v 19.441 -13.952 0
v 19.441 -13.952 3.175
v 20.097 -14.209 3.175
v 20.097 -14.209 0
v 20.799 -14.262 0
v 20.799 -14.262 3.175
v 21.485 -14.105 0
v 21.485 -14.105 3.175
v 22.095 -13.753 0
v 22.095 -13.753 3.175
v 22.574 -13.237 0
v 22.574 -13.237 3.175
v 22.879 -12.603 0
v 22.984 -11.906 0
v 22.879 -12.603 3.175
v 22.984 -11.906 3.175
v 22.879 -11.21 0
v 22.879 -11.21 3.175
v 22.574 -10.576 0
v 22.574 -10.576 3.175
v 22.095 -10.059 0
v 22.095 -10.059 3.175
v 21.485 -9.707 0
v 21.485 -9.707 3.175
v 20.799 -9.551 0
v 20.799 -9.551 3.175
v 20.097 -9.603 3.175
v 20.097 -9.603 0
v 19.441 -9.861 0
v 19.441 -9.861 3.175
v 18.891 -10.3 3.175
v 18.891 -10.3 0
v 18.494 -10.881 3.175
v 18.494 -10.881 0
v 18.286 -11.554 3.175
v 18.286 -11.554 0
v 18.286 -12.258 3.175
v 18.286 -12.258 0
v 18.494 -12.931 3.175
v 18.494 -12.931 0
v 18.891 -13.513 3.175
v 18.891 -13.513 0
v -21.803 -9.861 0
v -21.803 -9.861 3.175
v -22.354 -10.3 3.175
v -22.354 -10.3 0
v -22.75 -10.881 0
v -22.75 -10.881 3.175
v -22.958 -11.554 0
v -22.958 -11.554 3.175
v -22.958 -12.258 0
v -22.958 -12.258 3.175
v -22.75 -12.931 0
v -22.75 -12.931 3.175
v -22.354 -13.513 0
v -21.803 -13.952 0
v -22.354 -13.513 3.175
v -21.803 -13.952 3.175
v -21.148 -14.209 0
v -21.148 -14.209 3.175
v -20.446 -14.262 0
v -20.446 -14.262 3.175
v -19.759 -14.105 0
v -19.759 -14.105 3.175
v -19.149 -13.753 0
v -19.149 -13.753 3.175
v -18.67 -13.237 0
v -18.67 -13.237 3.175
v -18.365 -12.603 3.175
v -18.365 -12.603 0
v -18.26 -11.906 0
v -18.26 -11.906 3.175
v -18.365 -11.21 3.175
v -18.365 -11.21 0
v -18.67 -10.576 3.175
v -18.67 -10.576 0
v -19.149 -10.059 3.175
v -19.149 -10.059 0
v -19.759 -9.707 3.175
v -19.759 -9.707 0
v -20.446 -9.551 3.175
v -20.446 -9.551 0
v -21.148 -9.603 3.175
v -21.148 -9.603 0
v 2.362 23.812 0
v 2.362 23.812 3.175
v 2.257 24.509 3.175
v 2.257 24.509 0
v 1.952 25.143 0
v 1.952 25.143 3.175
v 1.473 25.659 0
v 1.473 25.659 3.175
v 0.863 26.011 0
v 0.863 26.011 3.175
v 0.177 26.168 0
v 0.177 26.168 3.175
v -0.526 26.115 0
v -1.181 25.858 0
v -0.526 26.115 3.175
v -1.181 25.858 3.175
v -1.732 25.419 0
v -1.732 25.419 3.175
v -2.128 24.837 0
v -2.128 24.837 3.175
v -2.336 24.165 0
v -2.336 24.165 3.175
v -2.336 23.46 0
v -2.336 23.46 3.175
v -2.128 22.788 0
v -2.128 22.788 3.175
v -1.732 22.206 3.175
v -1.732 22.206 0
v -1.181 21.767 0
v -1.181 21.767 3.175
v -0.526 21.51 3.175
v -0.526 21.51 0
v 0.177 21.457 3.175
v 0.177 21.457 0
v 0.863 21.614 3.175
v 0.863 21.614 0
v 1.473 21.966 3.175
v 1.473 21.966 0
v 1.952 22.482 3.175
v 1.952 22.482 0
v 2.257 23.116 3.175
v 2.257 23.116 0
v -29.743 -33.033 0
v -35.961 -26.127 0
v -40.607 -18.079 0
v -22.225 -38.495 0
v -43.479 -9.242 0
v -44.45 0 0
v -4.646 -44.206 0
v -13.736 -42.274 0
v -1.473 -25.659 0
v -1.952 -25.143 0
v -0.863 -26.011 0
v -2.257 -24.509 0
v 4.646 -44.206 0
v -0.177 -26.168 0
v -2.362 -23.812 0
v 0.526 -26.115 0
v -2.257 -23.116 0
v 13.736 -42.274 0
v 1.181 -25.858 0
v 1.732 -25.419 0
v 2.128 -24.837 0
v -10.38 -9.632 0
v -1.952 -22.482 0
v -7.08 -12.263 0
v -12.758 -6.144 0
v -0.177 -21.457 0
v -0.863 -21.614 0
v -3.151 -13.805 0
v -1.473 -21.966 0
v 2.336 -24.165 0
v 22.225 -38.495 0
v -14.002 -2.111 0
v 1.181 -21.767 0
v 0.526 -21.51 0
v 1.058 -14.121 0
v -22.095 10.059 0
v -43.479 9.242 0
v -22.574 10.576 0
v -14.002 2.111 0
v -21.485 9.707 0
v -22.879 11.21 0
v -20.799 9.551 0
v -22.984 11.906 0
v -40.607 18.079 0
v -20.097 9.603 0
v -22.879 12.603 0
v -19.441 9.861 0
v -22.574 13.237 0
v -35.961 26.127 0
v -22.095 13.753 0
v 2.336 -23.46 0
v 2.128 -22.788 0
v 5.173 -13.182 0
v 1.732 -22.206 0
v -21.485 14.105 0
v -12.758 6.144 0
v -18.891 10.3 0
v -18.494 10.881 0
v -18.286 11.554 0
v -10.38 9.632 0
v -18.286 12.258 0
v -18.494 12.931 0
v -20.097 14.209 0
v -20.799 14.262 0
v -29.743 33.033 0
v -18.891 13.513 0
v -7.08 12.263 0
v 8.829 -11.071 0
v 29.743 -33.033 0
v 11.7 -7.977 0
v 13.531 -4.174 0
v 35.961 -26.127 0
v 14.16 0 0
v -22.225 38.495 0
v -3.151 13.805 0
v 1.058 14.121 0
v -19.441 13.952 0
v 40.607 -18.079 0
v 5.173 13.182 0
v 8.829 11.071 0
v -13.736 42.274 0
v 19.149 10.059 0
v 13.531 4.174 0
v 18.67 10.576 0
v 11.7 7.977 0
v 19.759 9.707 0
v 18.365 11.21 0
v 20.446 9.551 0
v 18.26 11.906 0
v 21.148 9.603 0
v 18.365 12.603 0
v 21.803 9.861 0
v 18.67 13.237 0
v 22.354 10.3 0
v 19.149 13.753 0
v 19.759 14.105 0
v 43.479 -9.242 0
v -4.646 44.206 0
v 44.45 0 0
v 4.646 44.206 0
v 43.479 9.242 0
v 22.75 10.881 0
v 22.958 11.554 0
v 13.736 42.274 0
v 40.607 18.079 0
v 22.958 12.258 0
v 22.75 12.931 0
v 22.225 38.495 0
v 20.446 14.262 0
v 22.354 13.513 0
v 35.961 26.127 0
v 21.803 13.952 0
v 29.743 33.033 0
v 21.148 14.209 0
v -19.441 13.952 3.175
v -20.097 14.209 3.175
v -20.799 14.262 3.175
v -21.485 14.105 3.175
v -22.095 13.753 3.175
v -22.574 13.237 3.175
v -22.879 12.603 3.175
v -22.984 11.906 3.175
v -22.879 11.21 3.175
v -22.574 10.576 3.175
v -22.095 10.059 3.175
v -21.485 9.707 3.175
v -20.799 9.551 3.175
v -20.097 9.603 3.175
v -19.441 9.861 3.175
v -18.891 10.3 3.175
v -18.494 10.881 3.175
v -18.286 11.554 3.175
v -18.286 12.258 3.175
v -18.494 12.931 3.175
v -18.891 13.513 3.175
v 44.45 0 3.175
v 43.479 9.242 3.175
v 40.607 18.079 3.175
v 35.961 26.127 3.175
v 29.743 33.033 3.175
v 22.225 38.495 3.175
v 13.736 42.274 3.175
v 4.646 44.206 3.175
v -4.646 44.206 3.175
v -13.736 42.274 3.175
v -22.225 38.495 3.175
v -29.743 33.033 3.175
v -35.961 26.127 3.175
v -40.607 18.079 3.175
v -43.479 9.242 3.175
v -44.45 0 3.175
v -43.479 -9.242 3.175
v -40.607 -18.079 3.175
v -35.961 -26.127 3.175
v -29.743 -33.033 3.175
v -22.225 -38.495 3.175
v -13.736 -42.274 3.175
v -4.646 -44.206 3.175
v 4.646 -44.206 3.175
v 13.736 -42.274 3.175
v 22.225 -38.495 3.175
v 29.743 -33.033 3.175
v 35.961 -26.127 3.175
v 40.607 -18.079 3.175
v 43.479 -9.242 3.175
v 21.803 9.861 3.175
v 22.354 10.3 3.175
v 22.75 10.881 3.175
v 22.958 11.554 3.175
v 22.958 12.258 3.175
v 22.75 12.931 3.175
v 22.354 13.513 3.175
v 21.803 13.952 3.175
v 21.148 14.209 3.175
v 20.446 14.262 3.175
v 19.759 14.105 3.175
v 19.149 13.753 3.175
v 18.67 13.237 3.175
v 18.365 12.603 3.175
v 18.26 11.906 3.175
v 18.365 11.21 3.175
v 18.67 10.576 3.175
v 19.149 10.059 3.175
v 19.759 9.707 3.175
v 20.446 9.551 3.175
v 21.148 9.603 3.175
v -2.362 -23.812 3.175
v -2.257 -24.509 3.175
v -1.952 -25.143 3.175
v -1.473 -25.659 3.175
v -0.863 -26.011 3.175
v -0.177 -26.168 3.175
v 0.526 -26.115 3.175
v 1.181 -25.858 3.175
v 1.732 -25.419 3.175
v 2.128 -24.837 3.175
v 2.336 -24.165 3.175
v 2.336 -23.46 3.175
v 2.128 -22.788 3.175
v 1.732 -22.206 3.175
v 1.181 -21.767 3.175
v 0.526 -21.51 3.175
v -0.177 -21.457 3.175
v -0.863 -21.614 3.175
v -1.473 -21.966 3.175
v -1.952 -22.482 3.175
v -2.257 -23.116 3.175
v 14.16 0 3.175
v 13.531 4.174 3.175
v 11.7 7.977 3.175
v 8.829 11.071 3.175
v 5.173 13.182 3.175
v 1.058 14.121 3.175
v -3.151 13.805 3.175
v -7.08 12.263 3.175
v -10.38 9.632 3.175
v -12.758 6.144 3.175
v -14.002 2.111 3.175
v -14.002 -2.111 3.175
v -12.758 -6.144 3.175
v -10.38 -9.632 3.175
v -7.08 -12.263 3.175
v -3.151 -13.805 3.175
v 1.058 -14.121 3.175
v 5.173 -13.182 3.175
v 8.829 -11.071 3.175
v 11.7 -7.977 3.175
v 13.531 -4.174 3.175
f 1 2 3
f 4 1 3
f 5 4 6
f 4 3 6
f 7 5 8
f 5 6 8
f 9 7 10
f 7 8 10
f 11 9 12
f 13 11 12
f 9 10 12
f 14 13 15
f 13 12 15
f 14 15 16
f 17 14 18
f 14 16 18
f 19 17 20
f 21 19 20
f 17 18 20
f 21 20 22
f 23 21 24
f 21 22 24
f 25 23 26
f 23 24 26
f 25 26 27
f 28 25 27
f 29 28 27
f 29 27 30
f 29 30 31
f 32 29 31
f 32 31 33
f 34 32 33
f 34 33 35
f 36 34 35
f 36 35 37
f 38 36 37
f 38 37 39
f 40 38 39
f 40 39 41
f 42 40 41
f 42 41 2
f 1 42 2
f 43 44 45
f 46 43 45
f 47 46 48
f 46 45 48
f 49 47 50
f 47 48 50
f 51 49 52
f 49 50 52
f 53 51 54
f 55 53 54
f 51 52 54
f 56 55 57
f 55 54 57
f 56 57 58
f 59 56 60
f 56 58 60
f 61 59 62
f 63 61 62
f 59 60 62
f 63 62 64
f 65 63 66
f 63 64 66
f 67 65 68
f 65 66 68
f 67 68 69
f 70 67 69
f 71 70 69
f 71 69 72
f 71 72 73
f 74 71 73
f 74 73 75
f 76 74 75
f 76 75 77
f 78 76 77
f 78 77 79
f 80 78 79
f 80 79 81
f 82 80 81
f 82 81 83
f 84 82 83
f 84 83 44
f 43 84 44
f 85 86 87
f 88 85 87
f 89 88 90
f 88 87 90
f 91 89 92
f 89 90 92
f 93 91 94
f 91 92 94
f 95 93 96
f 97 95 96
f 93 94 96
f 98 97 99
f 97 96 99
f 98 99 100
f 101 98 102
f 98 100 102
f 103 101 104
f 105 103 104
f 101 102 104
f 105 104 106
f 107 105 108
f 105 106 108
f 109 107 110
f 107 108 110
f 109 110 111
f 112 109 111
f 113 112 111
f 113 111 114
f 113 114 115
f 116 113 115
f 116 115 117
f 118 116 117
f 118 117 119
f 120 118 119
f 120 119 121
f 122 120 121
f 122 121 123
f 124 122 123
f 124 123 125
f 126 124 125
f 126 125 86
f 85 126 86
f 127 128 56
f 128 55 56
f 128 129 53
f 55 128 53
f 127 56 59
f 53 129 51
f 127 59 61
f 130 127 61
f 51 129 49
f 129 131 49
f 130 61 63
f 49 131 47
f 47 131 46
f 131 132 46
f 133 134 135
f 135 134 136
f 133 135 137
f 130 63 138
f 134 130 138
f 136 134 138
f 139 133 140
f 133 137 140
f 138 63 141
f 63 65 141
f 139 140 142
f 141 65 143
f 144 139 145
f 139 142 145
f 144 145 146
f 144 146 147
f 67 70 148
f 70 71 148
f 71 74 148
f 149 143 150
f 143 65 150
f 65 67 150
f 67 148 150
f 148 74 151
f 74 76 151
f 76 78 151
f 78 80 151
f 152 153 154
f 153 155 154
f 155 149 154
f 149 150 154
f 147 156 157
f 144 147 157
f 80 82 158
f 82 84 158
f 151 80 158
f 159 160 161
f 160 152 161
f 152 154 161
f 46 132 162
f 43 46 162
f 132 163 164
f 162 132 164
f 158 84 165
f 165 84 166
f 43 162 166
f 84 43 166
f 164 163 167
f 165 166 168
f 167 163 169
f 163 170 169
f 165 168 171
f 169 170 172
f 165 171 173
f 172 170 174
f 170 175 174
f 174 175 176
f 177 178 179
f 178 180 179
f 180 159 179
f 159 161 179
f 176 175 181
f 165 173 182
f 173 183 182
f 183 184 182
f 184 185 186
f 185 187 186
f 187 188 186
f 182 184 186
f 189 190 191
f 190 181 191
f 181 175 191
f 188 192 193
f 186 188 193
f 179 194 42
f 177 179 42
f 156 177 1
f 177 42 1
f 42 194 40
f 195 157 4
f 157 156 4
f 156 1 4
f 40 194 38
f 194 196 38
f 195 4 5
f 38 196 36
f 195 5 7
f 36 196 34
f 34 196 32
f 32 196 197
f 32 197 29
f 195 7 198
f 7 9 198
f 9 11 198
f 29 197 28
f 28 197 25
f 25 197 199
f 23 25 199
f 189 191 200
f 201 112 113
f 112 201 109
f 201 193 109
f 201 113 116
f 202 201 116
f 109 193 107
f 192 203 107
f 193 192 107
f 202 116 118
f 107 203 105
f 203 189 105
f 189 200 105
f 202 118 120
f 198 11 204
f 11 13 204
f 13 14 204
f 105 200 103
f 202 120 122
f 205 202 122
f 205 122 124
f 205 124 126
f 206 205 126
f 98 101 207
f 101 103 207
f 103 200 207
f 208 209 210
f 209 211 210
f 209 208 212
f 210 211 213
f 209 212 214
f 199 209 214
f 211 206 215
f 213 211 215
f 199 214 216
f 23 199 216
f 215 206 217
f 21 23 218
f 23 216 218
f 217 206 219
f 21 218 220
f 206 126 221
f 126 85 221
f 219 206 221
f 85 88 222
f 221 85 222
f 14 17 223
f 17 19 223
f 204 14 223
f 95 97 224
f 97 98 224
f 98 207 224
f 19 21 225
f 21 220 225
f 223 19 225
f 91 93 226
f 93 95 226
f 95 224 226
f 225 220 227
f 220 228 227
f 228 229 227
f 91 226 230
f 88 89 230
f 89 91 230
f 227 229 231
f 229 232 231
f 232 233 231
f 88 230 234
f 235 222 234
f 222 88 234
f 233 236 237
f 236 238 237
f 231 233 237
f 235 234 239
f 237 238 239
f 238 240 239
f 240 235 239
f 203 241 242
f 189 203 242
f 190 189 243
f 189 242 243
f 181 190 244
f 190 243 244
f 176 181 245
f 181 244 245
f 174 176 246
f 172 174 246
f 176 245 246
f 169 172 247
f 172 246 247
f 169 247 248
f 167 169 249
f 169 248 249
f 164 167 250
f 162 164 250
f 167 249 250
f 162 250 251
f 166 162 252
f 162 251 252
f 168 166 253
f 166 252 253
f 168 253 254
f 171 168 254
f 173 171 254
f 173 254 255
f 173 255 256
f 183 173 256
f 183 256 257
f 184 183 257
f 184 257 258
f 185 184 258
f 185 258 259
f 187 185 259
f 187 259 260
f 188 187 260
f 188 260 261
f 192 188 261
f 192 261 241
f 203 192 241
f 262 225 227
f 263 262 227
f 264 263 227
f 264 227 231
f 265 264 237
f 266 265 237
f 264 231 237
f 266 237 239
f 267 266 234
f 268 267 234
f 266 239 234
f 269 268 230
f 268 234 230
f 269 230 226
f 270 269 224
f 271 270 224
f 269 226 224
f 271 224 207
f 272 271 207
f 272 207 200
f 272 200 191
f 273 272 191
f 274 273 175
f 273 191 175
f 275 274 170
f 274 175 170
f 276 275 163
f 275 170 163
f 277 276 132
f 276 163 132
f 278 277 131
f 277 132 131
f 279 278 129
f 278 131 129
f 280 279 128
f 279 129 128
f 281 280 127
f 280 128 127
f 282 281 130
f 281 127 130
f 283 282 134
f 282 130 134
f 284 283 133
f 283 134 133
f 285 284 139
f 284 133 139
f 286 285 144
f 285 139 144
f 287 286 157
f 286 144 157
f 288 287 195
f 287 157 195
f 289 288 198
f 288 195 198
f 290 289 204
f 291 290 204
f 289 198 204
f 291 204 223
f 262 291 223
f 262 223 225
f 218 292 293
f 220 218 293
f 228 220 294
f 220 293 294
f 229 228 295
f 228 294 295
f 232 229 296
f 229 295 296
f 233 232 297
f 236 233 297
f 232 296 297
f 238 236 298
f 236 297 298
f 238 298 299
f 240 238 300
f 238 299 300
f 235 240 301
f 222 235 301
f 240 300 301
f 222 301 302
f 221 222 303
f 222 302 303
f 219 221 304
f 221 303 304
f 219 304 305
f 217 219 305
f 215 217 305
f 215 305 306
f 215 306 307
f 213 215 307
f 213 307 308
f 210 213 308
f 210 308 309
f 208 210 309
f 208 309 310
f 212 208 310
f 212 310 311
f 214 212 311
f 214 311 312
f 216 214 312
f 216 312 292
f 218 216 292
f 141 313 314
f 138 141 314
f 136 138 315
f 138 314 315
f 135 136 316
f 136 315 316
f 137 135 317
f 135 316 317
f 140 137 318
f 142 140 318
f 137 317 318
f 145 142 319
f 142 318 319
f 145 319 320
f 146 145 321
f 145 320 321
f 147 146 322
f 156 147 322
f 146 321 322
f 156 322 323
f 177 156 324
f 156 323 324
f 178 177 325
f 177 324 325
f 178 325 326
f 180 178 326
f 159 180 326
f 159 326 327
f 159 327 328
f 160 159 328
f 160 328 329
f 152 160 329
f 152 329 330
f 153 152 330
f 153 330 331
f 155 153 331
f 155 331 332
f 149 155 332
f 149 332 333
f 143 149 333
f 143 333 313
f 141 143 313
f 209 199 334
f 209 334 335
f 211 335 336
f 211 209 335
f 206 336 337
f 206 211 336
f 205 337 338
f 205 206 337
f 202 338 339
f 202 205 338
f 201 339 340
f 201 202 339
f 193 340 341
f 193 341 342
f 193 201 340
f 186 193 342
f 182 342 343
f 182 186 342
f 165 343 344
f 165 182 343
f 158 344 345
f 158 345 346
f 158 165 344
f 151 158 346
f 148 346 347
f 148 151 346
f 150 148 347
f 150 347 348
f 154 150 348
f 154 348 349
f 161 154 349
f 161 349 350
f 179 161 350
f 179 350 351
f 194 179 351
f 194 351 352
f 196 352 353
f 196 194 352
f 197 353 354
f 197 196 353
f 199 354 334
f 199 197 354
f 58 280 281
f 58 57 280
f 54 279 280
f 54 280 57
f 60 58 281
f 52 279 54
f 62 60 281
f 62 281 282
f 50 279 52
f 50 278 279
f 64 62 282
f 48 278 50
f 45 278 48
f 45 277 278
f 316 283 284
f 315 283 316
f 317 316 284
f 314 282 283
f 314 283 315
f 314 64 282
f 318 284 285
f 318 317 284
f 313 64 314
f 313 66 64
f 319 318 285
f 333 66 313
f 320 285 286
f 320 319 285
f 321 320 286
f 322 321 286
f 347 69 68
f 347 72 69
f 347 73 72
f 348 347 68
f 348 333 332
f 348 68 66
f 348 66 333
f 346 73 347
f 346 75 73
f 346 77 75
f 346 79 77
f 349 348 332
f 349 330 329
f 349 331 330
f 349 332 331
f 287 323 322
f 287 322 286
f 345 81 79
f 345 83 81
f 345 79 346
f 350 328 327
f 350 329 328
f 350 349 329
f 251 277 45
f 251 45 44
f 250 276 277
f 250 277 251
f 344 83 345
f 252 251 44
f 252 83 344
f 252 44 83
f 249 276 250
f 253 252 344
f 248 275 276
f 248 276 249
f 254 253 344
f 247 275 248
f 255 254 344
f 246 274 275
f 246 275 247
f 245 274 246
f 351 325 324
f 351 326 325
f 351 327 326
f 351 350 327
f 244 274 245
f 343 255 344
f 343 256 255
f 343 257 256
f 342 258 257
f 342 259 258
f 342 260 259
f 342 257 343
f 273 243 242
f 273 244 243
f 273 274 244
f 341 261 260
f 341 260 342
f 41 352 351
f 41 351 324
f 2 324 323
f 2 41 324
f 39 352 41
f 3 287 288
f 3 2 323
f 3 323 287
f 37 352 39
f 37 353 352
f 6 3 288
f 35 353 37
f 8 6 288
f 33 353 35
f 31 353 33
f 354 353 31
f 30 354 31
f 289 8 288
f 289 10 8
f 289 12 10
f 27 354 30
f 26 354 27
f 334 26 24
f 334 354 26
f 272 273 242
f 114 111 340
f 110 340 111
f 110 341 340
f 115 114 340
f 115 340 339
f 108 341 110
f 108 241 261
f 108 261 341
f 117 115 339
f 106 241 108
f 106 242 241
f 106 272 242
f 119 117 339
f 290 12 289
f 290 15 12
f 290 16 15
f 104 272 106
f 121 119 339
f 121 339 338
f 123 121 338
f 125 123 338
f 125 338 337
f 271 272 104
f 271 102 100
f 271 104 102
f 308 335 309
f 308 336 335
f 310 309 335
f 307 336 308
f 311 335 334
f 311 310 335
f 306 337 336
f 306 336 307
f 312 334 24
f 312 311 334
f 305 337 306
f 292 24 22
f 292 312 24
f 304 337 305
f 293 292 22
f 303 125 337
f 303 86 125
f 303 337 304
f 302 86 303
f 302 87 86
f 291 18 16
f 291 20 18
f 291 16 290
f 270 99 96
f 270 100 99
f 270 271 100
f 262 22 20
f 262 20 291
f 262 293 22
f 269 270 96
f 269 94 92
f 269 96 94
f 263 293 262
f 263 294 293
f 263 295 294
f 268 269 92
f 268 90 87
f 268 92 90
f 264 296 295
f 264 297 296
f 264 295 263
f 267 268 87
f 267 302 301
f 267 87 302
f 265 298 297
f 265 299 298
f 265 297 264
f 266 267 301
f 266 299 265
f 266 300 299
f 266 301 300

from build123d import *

# Parameters (mm, degrees)
F0_R            = 44.45
F0_R_2          = 14.1605
F1_DEPTH        = 3.175
F2_R            = 2.3622
F3_DEPTH        = 3.176
F3_COPIES_COUNT = 6


# Not quite as in the source:
# - a pattern or mirror of a feature is missing from the dataset's text; its kind, count and spacing are read off the source's solid


with BuildPart() as f1:
    # F0 (on Top) → F1 (new body)
    with BuildSketch(Plane.XY):
        Circle(F0_R)
        Circle(F0_R_2, mode=Mode.SUBTRACT)
    extrude(amount=F1_DEPTH)

    # F2 (on face) → F3 (cut, through all)
    with BuildSketch(Plane.XY.offset(3.175)):
        with Locations((0, 23.8125)):
            Circle(F2_R)
    f3 = extrude(amount=-F3_DEPTH, mode=Mode.SUBTRACT)

    # F3_copies: F3 ×6 about axis
    f3_copies_axis = Axis((0, 0, 0), (0, 0, 1))
    for i in range(1, F3_COPIES_COUNT):
        add(f3.rotate(f3_copies_axis, i * 360 / F3_COPIES_COUNT), mode=Mode.SUBTRACT)


solid = f1.part
